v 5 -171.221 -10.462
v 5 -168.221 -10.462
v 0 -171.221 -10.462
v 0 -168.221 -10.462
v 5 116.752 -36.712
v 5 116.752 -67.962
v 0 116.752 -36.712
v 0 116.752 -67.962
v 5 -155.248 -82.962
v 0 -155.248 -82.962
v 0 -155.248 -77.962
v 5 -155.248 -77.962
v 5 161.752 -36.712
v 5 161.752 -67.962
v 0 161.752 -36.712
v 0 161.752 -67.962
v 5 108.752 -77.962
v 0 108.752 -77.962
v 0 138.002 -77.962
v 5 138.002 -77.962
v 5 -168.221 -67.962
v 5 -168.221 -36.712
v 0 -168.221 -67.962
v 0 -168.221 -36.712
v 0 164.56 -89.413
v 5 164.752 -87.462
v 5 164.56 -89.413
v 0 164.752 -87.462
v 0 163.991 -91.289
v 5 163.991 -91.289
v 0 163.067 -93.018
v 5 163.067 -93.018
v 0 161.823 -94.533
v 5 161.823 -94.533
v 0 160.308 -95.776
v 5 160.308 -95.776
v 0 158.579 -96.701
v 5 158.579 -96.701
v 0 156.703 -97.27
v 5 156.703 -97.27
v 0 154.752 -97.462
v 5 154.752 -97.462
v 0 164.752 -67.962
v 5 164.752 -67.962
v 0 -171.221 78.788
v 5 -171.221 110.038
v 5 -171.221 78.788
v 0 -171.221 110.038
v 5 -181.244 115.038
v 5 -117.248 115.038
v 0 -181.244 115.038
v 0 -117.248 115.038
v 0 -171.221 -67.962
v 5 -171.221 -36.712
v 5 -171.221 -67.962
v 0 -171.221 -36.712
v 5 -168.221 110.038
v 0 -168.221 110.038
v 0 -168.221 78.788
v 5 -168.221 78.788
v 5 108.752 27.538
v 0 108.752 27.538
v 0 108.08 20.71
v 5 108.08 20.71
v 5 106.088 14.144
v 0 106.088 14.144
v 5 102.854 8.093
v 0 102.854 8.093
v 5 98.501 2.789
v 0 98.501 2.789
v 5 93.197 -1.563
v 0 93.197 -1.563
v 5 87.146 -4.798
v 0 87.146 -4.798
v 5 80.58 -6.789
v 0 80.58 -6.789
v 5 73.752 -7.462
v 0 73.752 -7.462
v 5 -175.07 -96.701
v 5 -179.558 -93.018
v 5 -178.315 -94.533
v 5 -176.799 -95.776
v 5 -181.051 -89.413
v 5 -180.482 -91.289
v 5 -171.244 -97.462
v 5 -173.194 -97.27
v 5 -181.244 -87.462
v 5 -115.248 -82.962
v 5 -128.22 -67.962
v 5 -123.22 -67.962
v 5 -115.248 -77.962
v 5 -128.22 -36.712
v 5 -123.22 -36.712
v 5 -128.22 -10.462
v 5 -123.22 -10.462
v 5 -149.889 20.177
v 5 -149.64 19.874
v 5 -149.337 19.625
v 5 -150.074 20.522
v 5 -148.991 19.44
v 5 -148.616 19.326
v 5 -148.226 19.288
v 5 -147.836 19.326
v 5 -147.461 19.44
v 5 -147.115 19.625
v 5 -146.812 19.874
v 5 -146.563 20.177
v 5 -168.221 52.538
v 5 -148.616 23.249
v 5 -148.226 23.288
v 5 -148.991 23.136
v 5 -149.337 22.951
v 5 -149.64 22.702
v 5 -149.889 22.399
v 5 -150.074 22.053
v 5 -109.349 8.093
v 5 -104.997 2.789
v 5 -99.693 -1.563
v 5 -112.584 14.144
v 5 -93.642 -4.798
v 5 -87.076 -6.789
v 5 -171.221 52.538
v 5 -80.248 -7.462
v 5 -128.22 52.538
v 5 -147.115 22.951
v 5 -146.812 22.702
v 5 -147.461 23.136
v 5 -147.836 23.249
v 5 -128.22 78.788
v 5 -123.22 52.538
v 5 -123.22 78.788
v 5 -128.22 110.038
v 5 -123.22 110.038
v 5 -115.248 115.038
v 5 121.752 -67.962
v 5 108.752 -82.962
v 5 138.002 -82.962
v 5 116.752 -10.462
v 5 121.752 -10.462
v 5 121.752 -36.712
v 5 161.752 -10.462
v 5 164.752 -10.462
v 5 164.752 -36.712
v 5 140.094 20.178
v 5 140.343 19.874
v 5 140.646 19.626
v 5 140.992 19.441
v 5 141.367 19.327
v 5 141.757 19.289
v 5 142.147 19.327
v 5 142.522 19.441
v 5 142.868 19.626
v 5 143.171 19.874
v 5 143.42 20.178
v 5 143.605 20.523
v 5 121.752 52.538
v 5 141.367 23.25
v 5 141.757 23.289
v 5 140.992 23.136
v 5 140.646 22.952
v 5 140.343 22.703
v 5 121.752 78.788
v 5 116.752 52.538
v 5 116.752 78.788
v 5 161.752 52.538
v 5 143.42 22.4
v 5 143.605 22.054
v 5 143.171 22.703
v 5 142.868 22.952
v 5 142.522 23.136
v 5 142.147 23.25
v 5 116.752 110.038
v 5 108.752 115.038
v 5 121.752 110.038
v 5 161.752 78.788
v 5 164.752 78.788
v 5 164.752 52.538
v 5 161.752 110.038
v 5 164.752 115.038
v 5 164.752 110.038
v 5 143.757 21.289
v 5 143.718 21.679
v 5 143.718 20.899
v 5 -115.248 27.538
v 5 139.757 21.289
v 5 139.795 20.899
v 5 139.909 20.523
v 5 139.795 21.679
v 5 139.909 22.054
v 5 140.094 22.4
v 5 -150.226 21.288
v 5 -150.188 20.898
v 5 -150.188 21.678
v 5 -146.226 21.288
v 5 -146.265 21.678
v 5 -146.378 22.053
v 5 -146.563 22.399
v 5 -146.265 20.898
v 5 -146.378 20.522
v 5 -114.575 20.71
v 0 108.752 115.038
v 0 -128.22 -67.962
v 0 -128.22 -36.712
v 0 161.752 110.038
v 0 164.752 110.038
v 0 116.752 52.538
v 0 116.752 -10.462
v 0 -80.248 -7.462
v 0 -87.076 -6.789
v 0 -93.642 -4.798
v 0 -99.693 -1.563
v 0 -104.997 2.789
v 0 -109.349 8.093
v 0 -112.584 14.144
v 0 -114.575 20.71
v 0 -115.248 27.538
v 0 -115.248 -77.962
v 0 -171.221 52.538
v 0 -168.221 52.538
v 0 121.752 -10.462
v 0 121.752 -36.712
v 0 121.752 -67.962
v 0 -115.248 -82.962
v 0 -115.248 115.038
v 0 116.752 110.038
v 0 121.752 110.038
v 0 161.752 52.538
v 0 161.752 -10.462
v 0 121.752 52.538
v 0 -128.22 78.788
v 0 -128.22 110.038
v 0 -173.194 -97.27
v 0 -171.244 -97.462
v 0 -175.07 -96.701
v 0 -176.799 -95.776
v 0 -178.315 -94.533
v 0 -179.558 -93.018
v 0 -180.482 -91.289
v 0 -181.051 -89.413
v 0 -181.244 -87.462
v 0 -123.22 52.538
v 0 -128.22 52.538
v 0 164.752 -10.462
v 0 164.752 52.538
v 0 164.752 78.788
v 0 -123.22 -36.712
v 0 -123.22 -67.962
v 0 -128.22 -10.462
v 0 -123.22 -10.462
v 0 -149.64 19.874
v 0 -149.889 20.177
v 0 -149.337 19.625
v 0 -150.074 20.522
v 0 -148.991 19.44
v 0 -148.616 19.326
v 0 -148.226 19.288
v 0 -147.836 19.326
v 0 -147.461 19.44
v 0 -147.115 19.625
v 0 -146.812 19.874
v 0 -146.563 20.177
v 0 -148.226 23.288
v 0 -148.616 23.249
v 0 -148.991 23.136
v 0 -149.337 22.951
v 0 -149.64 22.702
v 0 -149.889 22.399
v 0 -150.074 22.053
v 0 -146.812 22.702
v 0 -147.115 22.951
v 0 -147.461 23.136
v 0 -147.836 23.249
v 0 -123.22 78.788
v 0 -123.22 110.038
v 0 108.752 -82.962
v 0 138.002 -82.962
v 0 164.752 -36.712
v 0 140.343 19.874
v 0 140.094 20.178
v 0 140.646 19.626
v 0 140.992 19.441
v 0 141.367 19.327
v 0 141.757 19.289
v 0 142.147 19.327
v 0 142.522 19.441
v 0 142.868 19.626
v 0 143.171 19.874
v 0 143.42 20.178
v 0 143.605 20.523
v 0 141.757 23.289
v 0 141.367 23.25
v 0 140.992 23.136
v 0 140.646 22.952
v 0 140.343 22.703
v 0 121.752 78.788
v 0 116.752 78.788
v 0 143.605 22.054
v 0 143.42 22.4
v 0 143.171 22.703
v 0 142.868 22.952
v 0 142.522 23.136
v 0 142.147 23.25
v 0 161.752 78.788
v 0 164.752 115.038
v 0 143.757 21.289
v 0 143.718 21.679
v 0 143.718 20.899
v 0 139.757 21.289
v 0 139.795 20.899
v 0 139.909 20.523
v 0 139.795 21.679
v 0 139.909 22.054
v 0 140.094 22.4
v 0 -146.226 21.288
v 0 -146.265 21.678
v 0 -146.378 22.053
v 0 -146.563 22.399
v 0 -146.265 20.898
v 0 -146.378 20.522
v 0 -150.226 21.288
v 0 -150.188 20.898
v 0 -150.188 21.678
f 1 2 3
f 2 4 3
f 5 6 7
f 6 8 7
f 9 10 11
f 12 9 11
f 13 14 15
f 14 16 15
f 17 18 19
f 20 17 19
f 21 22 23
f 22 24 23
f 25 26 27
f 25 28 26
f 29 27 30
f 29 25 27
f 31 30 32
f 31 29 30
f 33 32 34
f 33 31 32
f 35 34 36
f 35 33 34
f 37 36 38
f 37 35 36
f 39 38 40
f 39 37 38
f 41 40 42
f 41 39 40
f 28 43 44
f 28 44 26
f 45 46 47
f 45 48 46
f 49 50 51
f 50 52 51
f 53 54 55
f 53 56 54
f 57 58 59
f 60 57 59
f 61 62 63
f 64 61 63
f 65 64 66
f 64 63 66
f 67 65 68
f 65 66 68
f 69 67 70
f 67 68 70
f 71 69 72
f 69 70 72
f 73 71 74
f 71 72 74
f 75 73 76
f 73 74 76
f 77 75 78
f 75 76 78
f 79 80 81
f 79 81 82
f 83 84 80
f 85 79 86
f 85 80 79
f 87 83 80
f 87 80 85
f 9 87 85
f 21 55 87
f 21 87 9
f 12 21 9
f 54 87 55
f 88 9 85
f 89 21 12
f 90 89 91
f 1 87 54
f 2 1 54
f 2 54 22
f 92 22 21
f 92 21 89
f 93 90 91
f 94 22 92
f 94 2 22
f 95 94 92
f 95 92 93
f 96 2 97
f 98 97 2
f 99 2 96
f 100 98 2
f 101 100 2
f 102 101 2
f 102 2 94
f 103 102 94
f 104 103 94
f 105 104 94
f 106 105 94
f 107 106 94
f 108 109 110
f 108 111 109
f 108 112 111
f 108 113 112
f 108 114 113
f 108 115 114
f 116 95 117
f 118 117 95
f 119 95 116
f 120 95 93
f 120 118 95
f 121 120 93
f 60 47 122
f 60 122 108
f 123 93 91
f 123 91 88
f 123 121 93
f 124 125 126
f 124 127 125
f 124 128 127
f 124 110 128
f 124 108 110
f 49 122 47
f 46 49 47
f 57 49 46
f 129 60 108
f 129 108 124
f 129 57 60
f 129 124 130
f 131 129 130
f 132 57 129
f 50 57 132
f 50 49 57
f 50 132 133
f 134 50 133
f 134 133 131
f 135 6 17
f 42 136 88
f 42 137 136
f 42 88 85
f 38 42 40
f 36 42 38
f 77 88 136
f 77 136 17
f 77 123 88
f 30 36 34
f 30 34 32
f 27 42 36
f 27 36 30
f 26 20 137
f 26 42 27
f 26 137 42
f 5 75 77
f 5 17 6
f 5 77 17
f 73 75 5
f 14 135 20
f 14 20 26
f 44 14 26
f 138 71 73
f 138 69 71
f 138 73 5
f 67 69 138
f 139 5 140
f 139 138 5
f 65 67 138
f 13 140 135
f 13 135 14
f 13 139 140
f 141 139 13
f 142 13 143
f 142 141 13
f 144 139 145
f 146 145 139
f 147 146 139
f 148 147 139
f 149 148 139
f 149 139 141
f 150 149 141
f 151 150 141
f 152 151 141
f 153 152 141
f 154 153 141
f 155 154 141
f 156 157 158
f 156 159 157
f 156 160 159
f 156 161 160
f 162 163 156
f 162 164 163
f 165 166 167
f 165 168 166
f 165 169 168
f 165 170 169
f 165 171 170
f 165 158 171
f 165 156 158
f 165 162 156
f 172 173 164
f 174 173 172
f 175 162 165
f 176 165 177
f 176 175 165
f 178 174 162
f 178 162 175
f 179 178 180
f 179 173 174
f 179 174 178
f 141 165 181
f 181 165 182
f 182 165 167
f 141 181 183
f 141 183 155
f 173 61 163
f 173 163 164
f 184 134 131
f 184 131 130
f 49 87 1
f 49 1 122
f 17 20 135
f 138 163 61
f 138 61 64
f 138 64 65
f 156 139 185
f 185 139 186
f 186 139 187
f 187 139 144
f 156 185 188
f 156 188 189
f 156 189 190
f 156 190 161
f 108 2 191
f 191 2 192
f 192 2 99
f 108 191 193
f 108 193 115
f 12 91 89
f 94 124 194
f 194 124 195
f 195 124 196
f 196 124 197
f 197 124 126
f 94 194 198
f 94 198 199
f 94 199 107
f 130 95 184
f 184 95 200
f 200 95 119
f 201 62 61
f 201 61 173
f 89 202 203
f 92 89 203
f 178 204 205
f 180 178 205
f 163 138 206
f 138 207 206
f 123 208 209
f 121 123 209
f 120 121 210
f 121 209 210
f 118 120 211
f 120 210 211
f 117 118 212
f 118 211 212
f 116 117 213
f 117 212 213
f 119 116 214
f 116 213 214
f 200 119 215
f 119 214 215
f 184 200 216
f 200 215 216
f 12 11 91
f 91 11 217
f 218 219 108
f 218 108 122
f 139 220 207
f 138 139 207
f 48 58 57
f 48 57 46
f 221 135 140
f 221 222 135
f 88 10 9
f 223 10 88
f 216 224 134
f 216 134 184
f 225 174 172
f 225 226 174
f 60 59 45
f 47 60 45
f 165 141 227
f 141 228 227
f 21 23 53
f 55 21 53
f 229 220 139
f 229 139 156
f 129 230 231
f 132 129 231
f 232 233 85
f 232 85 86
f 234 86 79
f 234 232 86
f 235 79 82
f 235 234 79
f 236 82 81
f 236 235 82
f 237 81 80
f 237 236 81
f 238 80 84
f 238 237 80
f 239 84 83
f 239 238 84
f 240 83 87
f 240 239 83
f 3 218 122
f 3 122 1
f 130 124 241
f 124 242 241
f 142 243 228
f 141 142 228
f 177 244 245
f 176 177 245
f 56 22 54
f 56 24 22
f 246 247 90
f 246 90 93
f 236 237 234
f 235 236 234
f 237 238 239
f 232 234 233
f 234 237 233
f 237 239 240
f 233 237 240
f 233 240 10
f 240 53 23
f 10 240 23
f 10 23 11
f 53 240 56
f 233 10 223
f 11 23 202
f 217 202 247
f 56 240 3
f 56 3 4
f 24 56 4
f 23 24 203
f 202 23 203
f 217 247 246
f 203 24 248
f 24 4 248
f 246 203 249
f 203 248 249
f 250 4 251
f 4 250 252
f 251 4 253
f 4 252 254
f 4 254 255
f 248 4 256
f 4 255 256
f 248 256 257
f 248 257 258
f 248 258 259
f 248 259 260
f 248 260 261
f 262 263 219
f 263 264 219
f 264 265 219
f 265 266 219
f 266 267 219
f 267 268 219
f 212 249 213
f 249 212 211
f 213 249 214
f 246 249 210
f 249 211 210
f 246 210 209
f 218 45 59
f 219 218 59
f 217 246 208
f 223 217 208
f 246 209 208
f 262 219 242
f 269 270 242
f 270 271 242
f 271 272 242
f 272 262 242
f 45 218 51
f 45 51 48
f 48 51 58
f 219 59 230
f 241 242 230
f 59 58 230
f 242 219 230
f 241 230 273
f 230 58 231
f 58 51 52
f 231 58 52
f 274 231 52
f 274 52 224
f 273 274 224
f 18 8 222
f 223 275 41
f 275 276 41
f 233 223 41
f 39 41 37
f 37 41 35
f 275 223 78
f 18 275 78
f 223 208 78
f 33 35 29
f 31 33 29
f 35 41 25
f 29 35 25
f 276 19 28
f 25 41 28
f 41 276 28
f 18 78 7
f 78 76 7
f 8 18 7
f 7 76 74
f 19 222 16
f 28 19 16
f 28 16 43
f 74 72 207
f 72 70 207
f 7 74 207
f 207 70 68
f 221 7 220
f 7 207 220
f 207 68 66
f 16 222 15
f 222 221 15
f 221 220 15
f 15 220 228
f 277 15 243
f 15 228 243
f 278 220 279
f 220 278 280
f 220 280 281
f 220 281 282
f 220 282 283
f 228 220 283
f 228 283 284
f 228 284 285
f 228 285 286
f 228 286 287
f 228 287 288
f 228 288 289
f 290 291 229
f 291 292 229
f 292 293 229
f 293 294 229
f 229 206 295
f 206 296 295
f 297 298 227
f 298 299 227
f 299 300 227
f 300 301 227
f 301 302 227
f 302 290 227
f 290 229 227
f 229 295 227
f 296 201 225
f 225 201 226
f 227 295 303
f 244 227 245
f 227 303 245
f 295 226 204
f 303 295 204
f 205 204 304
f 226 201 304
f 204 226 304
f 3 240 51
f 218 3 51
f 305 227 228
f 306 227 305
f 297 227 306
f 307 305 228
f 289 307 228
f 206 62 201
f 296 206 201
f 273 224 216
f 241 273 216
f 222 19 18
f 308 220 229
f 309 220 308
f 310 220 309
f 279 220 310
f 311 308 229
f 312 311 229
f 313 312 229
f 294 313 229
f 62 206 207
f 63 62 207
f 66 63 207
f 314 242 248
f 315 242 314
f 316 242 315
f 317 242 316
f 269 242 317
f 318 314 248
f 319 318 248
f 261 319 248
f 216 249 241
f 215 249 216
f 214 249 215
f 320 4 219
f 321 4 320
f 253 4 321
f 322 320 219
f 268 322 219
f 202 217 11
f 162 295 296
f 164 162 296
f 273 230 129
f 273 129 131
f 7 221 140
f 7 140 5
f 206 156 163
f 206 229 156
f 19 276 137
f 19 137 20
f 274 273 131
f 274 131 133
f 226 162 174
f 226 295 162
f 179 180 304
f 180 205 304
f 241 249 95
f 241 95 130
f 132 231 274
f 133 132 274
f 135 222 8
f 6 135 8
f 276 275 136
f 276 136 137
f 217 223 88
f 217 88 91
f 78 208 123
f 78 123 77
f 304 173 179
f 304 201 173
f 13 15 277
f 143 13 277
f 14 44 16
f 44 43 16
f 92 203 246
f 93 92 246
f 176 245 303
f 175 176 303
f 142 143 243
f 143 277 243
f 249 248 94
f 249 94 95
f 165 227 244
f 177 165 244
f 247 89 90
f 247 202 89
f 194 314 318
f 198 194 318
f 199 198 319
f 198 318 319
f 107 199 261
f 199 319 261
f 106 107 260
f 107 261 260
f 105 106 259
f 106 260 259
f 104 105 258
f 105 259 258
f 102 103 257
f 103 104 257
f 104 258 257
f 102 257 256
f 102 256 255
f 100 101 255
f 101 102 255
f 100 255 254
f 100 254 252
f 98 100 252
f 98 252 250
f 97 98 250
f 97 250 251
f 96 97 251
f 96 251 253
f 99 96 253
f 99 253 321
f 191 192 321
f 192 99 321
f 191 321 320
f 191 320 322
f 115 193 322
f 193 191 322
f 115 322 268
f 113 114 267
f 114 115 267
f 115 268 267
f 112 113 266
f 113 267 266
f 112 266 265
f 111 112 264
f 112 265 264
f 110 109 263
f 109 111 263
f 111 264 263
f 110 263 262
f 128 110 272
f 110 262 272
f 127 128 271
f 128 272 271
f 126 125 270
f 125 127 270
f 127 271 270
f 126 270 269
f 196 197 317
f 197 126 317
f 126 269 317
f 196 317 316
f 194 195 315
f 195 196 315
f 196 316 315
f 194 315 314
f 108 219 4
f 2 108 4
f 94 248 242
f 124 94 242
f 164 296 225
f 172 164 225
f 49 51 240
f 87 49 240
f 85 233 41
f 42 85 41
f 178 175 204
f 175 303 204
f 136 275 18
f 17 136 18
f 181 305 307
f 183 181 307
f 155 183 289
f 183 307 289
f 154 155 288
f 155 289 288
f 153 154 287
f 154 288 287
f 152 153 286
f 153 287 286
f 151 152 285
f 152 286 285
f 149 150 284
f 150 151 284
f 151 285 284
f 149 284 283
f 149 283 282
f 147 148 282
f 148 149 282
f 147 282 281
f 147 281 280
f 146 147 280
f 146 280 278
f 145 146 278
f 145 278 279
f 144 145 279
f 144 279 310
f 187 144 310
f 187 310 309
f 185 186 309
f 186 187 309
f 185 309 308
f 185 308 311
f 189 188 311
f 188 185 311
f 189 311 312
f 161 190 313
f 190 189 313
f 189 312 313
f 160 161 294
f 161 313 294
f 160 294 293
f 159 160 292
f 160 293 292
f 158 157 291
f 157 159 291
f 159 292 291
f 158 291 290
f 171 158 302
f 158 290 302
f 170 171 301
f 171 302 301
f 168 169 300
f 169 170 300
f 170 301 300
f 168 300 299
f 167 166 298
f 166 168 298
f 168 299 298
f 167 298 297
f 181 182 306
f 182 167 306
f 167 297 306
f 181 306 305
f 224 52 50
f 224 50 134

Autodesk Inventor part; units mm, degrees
ref_plane "YZ Plane" through (0, 0, 0) normal (1, 0, 0) x (0, 1, 0)
ref_plane "XZ Plane" through (0, 0, 0) normal (0, 1, 0) x (-1, 0, 0)
ref_plane "XY Plane" through (0, 0, 0) normal (0, 0, 1) x (1, 0, 0)
sketch "Sketch1" plane through (0, 0, 0) normal (1, 0, 0) x (0, 1, 0)
  line L0 (-181.2435, 115.0382) -> (-181.2435, -87.4618)
  line L1 (-80.2478, -7.4618) -> (73.7522, -7.4618)
  line L2 (-171.2435, -97.4618) -> (154.7524, -97.4618)
  line L3 (164.7524, -67.9618) -> (164.7524, -87.4618)
  circle A0 centre (141.7569, 21.2887) radius 2
  line L4 (-117.2477, 115.0382) -> (-181.2435, 115.0382)
  line L5 (-117.2477, 115.0382) -> (-115.2478, 115.0382)
  line L6 (-115.2478, 115.0382) -> (-115.2478, 27.5382)
  line L7 (108.7522, 27.5382) -> (108.7522, 115.0382)
  line L8 (108.7522, 115.0382) -> (164.7524, 115.0382)
  arc A1 (-181.2435, -87.4618) -> (-171.2435, -97.4618) centre (-171.2435, -87.4618) ccw
  line L9 (-128.2203, -67.9618) -> (-128.2203, -36.7118)
  line L10 (-128.2203, -36.7118) -> (-123.2203, -36.7118)
  line L11 (-123.2203, -67.9618) -> (-123.2203, -36.7118)
  line L12 (-128.2203, -67.9618) -> (-123.2203, -67.9618)
  line L13 (-128.2203, -10.4618) -> (-128.2203, 52.5382)
  line L14 (-128.2203, -10.4618) -> (-123.2203, -10.4618)
  line L15 (-123.2203, -10.4618) -> (-123.2203, 52.5382)
  line L16 (-128.2203, 52.5382) -> (-123.2203, 52.5382)
  line L17 (-128.2203, 78.7882) -> (-123.2203, 78.7882)
  line L18 (-123.2203, 78.7882) -> (-123.2203, 110.0382)
  line L19 (-128.2203, 110.0382) -> (-123.2203, 110.0382)
  line L20 (-128.2203, 78.7882) -> (-128.2203, 110.0382)
  circle A2 centre (-148.2261, 21.2878) radius 2
  line L21 (121.7524, 78.7882) -> (121.7524, 110.0382) projected
  line L22 (121.7524, 110.0382) -> (116.7524, 110.0382) projected
  line L23 (116.7524, 78.7882) -> (116.7524, 110.0382) projected
  line L24 (121.7524, 78.7882) -> (116.7524, 78.7882) projected
  line L25 (121.7524, -10.4618) -> (121.7524, 52.5382) projected
  line L26 (121.7524, 52.5382) -> (116.7524, 52.5382) projected
  line L27 (116.7524, -10.4618) -> (116.7524, 52.5382) projected
  line L28 (121.7524, -10.4618) -> (116.7524, -10.4618) projected
  line L29 (121.7524, -67.9618) -> (121.7524, -36.7118) projected
  line L30 (121.7524, -36.7118) -> (116.7524, -36.7118) projected
  line L31 (116.7524, -67.9618) -> (116.7524, -36.7118) projected
  line L32 (121.7524, -67.9618) -> (116.7524, -67.9618) projected
  line L33 (164.7524, 110.0382) -> (164.7524, 115.0382)
  line L34 (161.7524, 110.0382) -> (164.7524, 110.0382)
  line L35 (161.7524, 78.7882) -> (161.7524, 110.0382)
  line L36 (164.7524, 78.7882) -> (161.7524, 78.7882)
  line L37 (164.7524, 52.5382) -> (164.7524, 78.7882)
  line L38 (161.7524, 52.5382) -> (164.7524, 52.5382)
  line L39 (161.7524, -10.4618) -> (161.7524, 52.5382)
  line L40 (164.7524, -10.4618) -> (161.7524, -10.4618)
  line L41 (164.7524, -36.7118) -> (164.7524, -10.4618)
  line L42 (161.7524, -36.7118) -> (164.7524, -36.7118)
  line L43 (161.7524, -67.9618) -> (161.7524, -36.7118)
  line L44 (164.7524, -67.9618) -> (161.7524, -67.9618)
  arc A3 (73.7522, -7.4618) -> (108.7522, 27.5382) centre (73.7522, 27.5382) ccw
  arc A4 (-115.2478, 27.5382) -> (-80.2478, -7.4618) centre (-80.2478, 27.5382) ccw
  line L45 (-155.2478, -82.9618) -> (-115.2478, -82.9618) projected
  line L46 (-115.2478, -82.9618) -> (-115.2478, -77.9618) projected
  line L47 (-155.2478, -77.9618) -> (-115.2478, -77.9618) projected
  line L48 (-155.2478, -82.9618) -> (-155.2478, -77.9618) projected
  line L49 (108.7522, -82.9618) -> (138.0022, -82.9618) projected
  line L50 (138.0022, -82.9618) -> (138.0022, -77.9618) projected
  line L51 (108.7522, -77.9618) -> (138.0022, -77.9618) projected
  line L52 (108.7522, -82.9618) -> (108.7522, -77.9618) projected
  arc A5 (154.7524, -97.4618) -> (164.7524, -87.4618) centre (154.7524, -87.4618) ccw
  line L53 (-168.221, -67.9618) -> (-171.221, -67.9618)
  line L54 (-171.221, -36.7118) -> (-171.221, -67.9618)
  line L55 (-168.221, -36.7118) -> (-168.221, -67.9618)
  line L56 (-168.221, -36.7118) -> (-171.221, -36.7118)
  line L57 (-168.221, -10.4618) -> (-171.221, -10.4618)
  line L58 (-168.221, 52.5382) -> (-168.221, -10.4618)
  line L59 (-171.221, 52.5382) -> (-171.221, -10.4618)
  line L60 (-168.221, 52.5382) -> (-171.221, 52.5382)
  line L61 (-168.221, 78.7882) -> (-171.221, 78.7882)
  line L62 (-171.221, 110.0382) -> (-171.221, 78.7882)
  line L63 (-168.221, 110.0382) -> (-168.221, 78.7882)
  line L64 (-168.221, 110.0382) -> (-171.221, 110.0382)
  point P0 (141.7524, 19.2994)
  point P1 (143.3399, 20.8869)
  point P2 (164.7524, -92.4608)
  point P3 (161.7524, -97.4618)
  point P4 (-176.2435, -97.4618)
  point P5 (-181.2435, -92.4608)
  point P6 (-115.2478, 7.8284)
  point P7 (-107.2347, -7.4618)
  point P8 (98.7522, -7.4618)
  point P9 (108.7522, 9.8153)
  point P10 (156.7524, -97.4618)
  point P11 (-95.2478, -7.4618)
  point P12 (-115.2478, 12.5382)
  dimension "d40" = 212.5
  dimension "d41" = 212.5
  dimension "d44" = 4
  dimension "d50" = 35
  dimension "d51" = 90
  dimension "d52" = 35
  dimension "d54" = 3
  dimension "d55" = 10
extrude "Extrusion1" add sketch "Sketch1" along normal blind 5
properties part number "side bracer" material "Brass, Soft Yellow"
